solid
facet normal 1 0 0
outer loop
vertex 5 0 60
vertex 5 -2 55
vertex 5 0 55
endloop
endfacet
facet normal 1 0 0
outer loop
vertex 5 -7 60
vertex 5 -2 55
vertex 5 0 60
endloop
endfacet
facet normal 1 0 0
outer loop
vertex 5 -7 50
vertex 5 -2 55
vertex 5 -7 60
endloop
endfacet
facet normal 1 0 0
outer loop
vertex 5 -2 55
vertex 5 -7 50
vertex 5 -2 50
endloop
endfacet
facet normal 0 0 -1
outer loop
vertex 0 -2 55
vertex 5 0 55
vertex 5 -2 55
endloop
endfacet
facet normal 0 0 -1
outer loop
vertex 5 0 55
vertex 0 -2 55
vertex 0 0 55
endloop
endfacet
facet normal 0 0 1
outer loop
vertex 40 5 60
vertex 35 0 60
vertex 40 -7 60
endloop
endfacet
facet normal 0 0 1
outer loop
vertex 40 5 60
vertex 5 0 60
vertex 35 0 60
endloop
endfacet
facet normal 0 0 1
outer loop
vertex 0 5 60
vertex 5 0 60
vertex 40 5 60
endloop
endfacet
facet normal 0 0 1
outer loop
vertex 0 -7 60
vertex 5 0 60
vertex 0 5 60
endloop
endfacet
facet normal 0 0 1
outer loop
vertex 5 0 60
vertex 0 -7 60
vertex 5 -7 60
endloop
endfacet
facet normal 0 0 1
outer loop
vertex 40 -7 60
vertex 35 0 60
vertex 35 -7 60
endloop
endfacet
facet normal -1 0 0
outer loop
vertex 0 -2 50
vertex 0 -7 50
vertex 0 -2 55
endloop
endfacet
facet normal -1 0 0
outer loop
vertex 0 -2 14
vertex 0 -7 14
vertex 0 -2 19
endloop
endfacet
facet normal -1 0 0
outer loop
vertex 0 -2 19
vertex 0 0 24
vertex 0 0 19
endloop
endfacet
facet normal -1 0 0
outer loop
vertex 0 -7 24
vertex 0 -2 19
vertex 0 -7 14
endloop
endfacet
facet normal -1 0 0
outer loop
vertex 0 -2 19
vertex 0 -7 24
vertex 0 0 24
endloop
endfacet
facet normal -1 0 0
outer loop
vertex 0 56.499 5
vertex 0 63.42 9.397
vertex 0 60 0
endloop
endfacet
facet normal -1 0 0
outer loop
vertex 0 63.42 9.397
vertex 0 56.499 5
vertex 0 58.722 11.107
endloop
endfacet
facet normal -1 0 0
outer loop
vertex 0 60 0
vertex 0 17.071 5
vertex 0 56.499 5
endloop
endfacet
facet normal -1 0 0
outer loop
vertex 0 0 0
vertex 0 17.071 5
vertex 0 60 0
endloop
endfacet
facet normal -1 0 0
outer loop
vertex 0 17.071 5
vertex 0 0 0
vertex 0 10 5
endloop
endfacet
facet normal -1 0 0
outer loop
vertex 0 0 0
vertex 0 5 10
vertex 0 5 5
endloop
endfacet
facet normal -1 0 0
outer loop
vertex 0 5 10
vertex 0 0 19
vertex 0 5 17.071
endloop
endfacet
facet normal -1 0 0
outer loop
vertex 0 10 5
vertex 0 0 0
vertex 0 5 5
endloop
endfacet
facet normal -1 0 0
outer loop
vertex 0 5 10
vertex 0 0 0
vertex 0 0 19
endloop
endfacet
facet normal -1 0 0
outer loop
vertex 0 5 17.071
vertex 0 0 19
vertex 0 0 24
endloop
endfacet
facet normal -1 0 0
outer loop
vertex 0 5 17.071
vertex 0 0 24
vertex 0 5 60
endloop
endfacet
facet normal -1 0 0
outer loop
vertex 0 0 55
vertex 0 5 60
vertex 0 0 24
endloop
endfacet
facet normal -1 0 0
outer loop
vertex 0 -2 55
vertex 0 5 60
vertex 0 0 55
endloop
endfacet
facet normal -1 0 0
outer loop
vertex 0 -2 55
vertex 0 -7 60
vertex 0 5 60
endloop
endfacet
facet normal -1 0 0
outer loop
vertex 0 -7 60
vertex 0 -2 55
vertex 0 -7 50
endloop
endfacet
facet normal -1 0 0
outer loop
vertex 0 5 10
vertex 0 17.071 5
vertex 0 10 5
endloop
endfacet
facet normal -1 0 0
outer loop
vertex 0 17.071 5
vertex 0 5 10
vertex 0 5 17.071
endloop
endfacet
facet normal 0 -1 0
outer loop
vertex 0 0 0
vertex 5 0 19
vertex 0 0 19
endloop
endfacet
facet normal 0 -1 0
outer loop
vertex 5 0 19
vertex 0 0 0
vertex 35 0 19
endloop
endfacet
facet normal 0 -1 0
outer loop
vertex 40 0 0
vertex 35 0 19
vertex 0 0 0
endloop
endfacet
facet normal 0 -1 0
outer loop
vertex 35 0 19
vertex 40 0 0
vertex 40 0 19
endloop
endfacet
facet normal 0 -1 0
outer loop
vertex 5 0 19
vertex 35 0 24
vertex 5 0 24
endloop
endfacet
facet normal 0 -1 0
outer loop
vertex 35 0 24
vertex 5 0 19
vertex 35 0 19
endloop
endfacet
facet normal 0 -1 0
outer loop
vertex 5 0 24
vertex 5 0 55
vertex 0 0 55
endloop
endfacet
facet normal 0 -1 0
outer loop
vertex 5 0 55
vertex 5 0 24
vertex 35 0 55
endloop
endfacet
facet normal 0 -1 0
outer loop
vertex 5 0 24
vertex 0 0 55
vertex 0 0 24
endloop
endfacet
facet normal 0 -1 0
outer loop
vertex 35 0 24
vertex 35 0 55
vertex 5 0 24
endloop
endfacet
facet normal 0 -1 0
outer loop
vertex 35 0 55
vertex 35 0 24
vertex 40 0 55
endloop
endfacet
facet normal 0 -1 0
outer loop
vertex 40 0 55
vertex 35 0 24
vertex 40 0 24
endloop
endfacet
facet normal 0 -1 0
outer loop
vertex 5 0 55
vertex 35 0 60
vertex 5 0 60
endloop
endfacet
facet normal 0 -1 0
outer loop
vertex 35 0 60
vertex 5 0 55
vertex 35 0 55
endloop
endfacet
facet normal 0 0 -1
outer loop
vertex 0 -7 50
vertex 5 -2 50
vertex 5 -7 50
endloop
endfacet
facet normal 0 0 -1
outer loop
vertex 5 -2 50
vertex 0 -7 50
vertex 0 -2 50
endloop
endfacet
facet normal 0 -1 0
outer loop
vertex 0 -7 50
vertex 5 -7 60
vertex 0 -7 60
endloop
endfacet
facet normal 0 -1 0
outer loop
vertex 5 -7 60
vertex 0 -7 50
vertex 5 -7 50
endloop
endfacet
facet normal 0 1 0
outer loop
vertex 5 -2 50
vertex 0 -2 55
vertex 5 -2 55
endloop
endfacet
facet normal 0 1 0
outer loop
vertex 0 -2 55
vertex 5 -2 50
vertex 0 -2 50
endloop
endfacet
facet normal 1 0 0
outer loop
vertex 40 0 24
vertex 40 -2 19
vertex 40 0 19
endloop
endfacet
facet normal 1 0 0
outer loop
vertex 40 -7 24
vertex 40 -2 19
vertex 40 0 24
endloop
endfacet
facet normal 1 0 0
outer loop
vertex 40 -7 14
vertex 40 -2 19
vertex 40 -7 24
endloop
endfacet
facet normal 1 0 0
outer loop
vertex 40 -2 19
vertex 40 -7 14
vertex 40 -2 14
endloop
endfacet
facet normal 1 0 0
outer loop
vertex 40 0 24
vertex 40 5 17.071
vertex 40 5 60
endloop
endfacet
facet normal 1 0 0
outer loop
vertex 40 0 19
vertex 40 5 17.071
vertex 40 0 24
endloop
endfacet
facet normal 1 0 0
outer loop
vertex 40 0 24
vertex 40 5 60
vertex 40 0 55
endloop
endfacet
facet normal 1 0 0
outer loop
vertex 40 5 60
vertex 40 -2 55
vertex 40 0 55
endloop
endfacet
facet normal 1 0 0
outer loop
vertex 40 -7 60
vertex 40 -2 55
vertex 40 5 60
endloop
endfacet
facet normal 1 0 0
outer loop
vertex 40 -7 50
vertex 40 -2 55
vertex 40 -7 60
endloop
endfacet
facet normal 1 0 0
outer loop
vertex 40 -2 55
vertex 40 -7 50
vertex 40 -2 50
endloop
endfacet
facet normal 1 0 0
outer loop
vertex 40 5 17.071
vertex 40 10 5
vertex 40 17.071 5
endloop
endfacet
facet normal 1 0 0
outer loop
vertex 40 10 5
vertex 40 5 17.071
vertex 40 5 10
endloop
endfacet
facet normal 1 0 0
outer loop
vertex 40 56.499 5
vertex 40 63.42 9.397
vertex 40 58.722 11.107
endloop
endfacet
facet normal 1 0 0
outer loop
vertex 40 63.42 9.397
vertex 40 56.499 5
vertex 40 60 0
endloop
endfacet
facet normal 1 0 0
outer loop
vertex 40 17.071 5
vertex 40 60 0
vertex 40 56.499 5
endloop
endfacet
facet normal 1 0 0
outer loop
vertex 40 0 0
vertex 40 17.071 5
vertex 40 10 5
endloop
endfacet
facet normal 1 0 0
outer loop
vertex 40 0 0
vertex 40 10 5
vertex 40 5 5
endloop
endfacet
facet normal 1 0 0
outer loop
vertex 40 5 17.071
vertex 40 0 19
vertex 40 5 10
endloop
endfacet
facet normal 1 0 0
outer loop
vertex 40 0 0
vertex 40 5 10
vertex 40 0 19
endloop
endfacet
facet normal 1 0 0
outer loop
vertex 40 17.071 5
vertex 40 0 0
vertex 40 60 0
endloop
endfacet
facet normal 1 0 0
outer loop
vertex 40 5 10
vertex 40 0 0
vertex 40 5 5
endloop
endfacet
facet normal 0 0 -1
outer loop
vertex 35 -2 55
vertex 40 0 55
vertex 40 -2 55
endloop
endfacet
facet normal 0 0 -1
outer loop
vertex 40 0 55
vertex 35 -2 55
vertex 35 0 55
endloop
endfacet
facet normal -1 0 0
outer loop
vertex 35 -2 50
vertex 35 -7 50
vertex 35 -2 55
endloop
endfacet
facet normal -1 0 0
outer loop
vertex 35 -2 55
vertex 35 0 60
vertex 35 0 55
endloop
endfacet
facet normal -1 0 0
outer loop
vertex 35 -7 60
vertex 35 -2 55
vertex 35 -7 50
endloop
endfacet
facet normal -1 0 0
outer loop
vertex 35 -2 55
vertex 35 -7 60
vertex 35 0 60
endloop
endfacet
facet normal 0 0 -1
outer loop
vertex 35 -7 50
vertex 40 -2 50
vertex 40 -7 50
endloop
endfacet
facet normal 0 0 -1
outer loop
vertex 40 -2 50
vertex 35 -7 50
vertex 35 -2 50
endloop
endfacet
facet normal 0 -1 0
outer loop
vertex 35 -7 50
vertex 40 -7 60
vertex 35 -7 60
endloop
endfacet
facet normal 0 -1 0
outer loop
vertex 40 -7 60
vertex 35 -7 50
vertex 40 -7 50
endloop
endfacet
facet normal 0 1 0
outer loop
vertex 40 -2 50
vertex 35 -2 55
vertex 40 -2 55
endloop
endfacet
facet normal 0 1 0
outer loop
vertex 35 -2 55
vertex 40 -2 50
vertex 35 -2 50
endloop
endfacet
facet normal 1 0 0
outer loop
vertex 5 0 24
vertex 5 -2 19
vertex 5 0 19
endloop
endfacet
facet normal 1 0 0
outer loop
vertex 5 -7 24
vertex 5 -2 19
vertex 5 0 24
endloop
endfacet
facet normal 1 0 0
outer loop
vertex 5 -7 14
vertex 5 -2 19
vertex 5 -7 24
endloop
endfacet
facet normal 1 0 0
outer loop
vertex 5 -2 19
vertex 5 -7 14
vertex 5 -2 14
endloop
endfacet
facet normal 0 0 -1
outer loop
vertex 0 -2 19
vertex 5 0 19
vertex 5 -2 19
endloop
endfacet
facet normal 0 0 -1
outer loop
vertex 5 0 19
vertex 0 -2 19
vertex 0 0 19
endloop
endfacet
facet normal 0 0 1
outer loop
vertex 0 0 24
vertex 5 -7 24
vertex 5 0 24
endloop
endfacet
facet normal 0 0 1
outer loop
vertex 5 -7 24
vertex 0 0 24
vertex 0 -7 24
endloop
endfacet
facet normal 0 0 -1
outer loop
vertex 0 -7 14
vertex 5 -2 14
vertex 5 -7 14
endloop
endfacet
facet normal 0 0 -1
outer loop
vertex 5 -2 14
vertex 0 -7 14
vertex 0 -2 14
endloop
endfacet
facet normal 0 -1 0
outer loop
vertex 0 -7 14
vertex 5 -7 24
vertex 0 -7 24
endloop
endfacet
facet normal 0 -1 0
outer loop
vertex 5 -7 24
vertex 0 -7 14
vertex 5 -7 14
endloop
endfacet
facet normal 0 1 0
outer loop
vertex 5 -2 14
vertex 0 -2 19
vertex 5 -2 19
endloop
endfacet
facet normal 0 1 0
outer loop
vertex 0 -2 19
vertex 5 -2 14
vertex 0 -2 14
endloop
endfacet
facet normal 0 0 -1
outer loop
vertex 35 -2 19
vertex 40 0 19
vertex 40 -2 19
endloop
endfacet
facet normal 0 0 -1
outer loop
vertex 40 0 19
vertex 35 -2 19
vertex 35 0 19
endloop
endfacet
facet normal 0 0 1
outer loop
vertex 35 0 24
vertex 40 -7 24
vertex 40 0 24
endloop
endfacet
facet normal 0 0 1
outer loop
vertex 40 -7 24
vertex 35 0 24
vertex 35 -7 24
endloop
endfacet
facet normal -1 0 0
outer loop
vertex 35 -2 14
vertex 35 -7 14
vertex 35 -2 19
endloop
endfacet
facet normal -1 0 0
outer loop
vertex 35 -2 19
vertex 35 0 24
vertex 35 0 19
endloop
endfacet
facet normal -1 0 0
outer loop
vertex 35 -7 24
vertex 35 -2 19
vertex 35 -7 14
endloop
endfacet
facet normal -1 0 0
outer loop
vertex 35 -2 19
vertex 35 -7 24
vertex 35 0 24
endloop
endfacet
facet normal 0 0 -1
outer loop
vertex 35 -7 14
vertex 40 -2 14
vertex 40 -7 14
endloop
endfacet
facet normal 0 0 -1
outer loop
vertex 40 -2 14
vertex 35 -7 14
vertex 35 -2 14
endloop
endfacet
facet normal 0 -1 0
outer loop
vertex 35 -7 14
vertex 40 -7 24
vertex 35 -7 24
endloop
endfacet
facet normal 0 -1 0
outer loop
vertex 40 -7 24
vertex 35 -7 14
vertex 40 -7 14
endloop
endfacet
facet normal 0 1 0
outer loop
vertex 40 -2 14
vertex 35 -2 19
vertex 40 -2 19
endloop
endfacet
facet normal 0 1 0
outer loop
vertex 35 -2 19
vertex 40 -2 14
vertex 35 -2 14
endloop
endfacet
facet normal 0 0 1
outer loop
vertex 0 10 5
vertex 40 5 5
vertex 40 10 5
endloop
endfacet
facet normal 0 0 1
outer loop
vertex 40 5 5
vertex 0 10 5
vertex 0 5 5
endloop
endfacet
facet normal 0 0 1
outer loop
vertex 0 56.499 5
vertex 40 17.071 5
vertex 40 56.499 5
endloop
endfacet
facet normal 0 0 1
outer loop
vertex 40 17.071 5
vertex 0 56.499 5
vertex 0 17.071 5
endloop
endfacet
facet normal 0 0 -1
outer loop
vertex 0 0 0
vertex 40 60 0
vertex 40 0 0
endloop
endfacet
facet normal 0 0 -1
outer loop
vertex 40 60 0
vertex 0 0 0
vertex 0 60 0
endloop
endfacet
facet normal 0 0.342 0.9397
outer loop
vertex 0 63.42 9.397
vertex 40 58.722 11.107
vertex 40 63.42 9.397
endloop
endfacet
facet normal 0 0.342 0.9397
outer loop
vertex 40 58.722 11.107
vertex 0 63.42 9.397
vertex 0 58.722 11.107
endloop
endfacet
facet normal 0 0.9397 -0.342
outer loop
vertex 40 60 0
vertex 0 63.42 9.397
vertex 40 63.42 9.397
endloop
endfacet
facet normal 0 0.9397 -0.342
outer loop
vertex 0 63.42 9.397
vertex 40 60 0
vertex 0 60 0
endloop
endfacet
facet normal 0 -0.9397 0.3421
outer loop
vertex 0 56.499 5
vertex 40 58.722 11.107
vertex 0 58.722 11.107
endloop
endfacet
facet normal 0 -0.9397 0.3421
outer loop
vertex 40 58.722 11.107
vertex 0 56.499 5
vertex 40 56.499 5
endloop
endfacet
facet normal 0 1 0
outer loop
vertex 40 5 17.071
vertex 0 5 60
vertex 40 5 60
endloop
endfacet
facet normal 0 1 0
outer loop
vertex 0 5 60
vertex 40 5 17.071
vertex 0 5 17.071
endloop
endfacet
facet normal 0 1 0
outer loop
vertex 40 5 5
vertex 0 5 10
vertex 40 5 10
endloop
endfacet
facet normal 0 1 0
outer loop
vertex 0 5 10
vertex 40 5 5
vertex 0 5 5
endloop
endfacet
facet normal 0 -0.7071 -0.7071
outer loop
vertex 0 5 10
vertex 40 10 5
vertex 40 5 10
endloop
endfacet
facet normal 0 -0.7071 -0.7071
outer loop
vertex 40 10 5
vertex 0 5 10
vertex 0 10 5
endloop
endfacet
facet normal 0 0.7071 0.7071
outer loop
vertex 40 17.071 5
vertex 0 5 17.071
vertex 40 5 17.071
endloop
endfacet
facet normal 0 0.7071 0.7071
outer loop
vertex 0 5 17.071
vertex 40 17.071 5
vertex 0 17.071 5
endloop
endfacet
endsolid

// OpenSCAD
cube([40, 60, 5]);
translate([0,60,0])
rotate([-20,0,0])
translate([0,-5,0])
cube([40, 5, 10]);

cube([40, 5, 60]);

translate([0,15,0])
rotate([45,0,0])
cube([40, 5, 20]);

translate([0,0,60])
hook();

translate([40-5,0,60])
hook();

translate([0,0,60-36])
hook();

translate([40-5,0,60-36])
hook();

module hook() {
rotate([180,0,0]){
cube([5, 5, 5]);
translate([0,2,0])
cube([5, 5, 10]);
}
 }
